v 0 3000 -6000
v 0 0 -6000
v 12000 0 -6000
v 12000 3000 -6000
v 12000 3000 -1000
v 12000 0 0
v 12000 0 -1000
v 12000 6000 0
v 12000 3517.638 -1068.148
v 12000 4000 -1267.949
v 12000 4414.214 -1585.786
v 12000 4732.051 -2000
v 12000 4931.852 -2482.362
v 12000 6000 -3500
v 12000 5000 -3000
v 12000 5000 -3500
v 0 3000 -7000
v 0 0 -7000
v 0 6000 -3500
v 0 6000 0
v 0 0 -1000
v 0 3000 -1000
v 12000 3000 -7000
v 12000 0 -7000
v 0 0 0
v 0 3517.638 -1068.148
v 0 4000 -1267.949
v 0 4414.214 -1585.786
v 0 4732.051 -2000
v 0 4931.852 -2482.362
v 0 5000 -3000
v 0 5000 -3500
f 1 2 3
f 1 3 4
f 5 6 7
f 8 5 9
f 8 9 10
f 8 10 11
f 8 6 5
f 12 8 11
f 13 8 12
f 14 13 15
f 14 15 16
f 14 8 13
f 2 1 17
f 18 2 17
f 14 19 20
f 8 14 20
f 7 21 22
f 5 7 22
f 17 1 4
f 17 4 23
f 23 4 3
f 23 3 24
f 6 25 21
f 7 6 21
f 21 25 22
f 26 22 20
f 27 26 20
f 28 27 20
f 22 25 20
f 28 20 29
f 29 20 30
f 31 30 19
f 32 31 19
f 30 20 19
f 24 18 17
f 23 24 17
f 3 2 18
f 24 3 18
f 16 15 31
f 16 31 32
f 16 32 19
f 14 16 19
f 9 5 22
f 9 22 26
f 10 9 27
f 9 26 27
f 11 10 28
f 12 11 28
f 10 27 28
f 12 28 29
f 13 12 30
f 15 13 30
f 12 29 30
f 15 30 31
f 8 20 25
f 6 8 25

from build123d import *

# Parameters (mm, degrees)
SKETCH1_W             = 1000
SKETCH1_H             = 3000
BOSS_EXTRUDE1_DEPTH   = 12000
BOSS_EXTRUDE1_2_DEPTH = 12000


with BuildPart() as part:
    # Sketch1 → Boss-Extrude1 (new body)
    with BuildSketch(Plane(origin=(0, 0, 0), x_dir=(0, 0, -1), z_dir=(1, 0, 0))):
        with Locations((6500, 1500)):
            Rectangle(SKETCH1_W, SKETCH1_H)
    extrude(amount=BOSS_EXTRUDE1_DEPTH)


with BuildPart() as body_2:
    # Sketch1 → Boss-Extrude1 2 (new body)
    with BuildSketch(Plane(origin=(0, 0, 0), x_dir=(0, 0, -1), z_dir=(1, 0, 0))):
        with BuildLine():
            Line((0, 0), (1000, 0))
            Line((1000, 0), (1000, 3000))
            ThreePointArc((1000, 3000), (1585.786437627, 4414.213562373), (3000, 5000))
            Line((3000, 5000), (3500, 5000))
            Line((3500, 5000), (3500, 6000))
            Line((3500, 6000), (0, 6000))
            Line((0, 6000), (0, 0))
        make_face()
    extrude(amount=BOSS_EXTRUDE1_2_DEPTH)


solid = Compound([part.part, body_2.part])
